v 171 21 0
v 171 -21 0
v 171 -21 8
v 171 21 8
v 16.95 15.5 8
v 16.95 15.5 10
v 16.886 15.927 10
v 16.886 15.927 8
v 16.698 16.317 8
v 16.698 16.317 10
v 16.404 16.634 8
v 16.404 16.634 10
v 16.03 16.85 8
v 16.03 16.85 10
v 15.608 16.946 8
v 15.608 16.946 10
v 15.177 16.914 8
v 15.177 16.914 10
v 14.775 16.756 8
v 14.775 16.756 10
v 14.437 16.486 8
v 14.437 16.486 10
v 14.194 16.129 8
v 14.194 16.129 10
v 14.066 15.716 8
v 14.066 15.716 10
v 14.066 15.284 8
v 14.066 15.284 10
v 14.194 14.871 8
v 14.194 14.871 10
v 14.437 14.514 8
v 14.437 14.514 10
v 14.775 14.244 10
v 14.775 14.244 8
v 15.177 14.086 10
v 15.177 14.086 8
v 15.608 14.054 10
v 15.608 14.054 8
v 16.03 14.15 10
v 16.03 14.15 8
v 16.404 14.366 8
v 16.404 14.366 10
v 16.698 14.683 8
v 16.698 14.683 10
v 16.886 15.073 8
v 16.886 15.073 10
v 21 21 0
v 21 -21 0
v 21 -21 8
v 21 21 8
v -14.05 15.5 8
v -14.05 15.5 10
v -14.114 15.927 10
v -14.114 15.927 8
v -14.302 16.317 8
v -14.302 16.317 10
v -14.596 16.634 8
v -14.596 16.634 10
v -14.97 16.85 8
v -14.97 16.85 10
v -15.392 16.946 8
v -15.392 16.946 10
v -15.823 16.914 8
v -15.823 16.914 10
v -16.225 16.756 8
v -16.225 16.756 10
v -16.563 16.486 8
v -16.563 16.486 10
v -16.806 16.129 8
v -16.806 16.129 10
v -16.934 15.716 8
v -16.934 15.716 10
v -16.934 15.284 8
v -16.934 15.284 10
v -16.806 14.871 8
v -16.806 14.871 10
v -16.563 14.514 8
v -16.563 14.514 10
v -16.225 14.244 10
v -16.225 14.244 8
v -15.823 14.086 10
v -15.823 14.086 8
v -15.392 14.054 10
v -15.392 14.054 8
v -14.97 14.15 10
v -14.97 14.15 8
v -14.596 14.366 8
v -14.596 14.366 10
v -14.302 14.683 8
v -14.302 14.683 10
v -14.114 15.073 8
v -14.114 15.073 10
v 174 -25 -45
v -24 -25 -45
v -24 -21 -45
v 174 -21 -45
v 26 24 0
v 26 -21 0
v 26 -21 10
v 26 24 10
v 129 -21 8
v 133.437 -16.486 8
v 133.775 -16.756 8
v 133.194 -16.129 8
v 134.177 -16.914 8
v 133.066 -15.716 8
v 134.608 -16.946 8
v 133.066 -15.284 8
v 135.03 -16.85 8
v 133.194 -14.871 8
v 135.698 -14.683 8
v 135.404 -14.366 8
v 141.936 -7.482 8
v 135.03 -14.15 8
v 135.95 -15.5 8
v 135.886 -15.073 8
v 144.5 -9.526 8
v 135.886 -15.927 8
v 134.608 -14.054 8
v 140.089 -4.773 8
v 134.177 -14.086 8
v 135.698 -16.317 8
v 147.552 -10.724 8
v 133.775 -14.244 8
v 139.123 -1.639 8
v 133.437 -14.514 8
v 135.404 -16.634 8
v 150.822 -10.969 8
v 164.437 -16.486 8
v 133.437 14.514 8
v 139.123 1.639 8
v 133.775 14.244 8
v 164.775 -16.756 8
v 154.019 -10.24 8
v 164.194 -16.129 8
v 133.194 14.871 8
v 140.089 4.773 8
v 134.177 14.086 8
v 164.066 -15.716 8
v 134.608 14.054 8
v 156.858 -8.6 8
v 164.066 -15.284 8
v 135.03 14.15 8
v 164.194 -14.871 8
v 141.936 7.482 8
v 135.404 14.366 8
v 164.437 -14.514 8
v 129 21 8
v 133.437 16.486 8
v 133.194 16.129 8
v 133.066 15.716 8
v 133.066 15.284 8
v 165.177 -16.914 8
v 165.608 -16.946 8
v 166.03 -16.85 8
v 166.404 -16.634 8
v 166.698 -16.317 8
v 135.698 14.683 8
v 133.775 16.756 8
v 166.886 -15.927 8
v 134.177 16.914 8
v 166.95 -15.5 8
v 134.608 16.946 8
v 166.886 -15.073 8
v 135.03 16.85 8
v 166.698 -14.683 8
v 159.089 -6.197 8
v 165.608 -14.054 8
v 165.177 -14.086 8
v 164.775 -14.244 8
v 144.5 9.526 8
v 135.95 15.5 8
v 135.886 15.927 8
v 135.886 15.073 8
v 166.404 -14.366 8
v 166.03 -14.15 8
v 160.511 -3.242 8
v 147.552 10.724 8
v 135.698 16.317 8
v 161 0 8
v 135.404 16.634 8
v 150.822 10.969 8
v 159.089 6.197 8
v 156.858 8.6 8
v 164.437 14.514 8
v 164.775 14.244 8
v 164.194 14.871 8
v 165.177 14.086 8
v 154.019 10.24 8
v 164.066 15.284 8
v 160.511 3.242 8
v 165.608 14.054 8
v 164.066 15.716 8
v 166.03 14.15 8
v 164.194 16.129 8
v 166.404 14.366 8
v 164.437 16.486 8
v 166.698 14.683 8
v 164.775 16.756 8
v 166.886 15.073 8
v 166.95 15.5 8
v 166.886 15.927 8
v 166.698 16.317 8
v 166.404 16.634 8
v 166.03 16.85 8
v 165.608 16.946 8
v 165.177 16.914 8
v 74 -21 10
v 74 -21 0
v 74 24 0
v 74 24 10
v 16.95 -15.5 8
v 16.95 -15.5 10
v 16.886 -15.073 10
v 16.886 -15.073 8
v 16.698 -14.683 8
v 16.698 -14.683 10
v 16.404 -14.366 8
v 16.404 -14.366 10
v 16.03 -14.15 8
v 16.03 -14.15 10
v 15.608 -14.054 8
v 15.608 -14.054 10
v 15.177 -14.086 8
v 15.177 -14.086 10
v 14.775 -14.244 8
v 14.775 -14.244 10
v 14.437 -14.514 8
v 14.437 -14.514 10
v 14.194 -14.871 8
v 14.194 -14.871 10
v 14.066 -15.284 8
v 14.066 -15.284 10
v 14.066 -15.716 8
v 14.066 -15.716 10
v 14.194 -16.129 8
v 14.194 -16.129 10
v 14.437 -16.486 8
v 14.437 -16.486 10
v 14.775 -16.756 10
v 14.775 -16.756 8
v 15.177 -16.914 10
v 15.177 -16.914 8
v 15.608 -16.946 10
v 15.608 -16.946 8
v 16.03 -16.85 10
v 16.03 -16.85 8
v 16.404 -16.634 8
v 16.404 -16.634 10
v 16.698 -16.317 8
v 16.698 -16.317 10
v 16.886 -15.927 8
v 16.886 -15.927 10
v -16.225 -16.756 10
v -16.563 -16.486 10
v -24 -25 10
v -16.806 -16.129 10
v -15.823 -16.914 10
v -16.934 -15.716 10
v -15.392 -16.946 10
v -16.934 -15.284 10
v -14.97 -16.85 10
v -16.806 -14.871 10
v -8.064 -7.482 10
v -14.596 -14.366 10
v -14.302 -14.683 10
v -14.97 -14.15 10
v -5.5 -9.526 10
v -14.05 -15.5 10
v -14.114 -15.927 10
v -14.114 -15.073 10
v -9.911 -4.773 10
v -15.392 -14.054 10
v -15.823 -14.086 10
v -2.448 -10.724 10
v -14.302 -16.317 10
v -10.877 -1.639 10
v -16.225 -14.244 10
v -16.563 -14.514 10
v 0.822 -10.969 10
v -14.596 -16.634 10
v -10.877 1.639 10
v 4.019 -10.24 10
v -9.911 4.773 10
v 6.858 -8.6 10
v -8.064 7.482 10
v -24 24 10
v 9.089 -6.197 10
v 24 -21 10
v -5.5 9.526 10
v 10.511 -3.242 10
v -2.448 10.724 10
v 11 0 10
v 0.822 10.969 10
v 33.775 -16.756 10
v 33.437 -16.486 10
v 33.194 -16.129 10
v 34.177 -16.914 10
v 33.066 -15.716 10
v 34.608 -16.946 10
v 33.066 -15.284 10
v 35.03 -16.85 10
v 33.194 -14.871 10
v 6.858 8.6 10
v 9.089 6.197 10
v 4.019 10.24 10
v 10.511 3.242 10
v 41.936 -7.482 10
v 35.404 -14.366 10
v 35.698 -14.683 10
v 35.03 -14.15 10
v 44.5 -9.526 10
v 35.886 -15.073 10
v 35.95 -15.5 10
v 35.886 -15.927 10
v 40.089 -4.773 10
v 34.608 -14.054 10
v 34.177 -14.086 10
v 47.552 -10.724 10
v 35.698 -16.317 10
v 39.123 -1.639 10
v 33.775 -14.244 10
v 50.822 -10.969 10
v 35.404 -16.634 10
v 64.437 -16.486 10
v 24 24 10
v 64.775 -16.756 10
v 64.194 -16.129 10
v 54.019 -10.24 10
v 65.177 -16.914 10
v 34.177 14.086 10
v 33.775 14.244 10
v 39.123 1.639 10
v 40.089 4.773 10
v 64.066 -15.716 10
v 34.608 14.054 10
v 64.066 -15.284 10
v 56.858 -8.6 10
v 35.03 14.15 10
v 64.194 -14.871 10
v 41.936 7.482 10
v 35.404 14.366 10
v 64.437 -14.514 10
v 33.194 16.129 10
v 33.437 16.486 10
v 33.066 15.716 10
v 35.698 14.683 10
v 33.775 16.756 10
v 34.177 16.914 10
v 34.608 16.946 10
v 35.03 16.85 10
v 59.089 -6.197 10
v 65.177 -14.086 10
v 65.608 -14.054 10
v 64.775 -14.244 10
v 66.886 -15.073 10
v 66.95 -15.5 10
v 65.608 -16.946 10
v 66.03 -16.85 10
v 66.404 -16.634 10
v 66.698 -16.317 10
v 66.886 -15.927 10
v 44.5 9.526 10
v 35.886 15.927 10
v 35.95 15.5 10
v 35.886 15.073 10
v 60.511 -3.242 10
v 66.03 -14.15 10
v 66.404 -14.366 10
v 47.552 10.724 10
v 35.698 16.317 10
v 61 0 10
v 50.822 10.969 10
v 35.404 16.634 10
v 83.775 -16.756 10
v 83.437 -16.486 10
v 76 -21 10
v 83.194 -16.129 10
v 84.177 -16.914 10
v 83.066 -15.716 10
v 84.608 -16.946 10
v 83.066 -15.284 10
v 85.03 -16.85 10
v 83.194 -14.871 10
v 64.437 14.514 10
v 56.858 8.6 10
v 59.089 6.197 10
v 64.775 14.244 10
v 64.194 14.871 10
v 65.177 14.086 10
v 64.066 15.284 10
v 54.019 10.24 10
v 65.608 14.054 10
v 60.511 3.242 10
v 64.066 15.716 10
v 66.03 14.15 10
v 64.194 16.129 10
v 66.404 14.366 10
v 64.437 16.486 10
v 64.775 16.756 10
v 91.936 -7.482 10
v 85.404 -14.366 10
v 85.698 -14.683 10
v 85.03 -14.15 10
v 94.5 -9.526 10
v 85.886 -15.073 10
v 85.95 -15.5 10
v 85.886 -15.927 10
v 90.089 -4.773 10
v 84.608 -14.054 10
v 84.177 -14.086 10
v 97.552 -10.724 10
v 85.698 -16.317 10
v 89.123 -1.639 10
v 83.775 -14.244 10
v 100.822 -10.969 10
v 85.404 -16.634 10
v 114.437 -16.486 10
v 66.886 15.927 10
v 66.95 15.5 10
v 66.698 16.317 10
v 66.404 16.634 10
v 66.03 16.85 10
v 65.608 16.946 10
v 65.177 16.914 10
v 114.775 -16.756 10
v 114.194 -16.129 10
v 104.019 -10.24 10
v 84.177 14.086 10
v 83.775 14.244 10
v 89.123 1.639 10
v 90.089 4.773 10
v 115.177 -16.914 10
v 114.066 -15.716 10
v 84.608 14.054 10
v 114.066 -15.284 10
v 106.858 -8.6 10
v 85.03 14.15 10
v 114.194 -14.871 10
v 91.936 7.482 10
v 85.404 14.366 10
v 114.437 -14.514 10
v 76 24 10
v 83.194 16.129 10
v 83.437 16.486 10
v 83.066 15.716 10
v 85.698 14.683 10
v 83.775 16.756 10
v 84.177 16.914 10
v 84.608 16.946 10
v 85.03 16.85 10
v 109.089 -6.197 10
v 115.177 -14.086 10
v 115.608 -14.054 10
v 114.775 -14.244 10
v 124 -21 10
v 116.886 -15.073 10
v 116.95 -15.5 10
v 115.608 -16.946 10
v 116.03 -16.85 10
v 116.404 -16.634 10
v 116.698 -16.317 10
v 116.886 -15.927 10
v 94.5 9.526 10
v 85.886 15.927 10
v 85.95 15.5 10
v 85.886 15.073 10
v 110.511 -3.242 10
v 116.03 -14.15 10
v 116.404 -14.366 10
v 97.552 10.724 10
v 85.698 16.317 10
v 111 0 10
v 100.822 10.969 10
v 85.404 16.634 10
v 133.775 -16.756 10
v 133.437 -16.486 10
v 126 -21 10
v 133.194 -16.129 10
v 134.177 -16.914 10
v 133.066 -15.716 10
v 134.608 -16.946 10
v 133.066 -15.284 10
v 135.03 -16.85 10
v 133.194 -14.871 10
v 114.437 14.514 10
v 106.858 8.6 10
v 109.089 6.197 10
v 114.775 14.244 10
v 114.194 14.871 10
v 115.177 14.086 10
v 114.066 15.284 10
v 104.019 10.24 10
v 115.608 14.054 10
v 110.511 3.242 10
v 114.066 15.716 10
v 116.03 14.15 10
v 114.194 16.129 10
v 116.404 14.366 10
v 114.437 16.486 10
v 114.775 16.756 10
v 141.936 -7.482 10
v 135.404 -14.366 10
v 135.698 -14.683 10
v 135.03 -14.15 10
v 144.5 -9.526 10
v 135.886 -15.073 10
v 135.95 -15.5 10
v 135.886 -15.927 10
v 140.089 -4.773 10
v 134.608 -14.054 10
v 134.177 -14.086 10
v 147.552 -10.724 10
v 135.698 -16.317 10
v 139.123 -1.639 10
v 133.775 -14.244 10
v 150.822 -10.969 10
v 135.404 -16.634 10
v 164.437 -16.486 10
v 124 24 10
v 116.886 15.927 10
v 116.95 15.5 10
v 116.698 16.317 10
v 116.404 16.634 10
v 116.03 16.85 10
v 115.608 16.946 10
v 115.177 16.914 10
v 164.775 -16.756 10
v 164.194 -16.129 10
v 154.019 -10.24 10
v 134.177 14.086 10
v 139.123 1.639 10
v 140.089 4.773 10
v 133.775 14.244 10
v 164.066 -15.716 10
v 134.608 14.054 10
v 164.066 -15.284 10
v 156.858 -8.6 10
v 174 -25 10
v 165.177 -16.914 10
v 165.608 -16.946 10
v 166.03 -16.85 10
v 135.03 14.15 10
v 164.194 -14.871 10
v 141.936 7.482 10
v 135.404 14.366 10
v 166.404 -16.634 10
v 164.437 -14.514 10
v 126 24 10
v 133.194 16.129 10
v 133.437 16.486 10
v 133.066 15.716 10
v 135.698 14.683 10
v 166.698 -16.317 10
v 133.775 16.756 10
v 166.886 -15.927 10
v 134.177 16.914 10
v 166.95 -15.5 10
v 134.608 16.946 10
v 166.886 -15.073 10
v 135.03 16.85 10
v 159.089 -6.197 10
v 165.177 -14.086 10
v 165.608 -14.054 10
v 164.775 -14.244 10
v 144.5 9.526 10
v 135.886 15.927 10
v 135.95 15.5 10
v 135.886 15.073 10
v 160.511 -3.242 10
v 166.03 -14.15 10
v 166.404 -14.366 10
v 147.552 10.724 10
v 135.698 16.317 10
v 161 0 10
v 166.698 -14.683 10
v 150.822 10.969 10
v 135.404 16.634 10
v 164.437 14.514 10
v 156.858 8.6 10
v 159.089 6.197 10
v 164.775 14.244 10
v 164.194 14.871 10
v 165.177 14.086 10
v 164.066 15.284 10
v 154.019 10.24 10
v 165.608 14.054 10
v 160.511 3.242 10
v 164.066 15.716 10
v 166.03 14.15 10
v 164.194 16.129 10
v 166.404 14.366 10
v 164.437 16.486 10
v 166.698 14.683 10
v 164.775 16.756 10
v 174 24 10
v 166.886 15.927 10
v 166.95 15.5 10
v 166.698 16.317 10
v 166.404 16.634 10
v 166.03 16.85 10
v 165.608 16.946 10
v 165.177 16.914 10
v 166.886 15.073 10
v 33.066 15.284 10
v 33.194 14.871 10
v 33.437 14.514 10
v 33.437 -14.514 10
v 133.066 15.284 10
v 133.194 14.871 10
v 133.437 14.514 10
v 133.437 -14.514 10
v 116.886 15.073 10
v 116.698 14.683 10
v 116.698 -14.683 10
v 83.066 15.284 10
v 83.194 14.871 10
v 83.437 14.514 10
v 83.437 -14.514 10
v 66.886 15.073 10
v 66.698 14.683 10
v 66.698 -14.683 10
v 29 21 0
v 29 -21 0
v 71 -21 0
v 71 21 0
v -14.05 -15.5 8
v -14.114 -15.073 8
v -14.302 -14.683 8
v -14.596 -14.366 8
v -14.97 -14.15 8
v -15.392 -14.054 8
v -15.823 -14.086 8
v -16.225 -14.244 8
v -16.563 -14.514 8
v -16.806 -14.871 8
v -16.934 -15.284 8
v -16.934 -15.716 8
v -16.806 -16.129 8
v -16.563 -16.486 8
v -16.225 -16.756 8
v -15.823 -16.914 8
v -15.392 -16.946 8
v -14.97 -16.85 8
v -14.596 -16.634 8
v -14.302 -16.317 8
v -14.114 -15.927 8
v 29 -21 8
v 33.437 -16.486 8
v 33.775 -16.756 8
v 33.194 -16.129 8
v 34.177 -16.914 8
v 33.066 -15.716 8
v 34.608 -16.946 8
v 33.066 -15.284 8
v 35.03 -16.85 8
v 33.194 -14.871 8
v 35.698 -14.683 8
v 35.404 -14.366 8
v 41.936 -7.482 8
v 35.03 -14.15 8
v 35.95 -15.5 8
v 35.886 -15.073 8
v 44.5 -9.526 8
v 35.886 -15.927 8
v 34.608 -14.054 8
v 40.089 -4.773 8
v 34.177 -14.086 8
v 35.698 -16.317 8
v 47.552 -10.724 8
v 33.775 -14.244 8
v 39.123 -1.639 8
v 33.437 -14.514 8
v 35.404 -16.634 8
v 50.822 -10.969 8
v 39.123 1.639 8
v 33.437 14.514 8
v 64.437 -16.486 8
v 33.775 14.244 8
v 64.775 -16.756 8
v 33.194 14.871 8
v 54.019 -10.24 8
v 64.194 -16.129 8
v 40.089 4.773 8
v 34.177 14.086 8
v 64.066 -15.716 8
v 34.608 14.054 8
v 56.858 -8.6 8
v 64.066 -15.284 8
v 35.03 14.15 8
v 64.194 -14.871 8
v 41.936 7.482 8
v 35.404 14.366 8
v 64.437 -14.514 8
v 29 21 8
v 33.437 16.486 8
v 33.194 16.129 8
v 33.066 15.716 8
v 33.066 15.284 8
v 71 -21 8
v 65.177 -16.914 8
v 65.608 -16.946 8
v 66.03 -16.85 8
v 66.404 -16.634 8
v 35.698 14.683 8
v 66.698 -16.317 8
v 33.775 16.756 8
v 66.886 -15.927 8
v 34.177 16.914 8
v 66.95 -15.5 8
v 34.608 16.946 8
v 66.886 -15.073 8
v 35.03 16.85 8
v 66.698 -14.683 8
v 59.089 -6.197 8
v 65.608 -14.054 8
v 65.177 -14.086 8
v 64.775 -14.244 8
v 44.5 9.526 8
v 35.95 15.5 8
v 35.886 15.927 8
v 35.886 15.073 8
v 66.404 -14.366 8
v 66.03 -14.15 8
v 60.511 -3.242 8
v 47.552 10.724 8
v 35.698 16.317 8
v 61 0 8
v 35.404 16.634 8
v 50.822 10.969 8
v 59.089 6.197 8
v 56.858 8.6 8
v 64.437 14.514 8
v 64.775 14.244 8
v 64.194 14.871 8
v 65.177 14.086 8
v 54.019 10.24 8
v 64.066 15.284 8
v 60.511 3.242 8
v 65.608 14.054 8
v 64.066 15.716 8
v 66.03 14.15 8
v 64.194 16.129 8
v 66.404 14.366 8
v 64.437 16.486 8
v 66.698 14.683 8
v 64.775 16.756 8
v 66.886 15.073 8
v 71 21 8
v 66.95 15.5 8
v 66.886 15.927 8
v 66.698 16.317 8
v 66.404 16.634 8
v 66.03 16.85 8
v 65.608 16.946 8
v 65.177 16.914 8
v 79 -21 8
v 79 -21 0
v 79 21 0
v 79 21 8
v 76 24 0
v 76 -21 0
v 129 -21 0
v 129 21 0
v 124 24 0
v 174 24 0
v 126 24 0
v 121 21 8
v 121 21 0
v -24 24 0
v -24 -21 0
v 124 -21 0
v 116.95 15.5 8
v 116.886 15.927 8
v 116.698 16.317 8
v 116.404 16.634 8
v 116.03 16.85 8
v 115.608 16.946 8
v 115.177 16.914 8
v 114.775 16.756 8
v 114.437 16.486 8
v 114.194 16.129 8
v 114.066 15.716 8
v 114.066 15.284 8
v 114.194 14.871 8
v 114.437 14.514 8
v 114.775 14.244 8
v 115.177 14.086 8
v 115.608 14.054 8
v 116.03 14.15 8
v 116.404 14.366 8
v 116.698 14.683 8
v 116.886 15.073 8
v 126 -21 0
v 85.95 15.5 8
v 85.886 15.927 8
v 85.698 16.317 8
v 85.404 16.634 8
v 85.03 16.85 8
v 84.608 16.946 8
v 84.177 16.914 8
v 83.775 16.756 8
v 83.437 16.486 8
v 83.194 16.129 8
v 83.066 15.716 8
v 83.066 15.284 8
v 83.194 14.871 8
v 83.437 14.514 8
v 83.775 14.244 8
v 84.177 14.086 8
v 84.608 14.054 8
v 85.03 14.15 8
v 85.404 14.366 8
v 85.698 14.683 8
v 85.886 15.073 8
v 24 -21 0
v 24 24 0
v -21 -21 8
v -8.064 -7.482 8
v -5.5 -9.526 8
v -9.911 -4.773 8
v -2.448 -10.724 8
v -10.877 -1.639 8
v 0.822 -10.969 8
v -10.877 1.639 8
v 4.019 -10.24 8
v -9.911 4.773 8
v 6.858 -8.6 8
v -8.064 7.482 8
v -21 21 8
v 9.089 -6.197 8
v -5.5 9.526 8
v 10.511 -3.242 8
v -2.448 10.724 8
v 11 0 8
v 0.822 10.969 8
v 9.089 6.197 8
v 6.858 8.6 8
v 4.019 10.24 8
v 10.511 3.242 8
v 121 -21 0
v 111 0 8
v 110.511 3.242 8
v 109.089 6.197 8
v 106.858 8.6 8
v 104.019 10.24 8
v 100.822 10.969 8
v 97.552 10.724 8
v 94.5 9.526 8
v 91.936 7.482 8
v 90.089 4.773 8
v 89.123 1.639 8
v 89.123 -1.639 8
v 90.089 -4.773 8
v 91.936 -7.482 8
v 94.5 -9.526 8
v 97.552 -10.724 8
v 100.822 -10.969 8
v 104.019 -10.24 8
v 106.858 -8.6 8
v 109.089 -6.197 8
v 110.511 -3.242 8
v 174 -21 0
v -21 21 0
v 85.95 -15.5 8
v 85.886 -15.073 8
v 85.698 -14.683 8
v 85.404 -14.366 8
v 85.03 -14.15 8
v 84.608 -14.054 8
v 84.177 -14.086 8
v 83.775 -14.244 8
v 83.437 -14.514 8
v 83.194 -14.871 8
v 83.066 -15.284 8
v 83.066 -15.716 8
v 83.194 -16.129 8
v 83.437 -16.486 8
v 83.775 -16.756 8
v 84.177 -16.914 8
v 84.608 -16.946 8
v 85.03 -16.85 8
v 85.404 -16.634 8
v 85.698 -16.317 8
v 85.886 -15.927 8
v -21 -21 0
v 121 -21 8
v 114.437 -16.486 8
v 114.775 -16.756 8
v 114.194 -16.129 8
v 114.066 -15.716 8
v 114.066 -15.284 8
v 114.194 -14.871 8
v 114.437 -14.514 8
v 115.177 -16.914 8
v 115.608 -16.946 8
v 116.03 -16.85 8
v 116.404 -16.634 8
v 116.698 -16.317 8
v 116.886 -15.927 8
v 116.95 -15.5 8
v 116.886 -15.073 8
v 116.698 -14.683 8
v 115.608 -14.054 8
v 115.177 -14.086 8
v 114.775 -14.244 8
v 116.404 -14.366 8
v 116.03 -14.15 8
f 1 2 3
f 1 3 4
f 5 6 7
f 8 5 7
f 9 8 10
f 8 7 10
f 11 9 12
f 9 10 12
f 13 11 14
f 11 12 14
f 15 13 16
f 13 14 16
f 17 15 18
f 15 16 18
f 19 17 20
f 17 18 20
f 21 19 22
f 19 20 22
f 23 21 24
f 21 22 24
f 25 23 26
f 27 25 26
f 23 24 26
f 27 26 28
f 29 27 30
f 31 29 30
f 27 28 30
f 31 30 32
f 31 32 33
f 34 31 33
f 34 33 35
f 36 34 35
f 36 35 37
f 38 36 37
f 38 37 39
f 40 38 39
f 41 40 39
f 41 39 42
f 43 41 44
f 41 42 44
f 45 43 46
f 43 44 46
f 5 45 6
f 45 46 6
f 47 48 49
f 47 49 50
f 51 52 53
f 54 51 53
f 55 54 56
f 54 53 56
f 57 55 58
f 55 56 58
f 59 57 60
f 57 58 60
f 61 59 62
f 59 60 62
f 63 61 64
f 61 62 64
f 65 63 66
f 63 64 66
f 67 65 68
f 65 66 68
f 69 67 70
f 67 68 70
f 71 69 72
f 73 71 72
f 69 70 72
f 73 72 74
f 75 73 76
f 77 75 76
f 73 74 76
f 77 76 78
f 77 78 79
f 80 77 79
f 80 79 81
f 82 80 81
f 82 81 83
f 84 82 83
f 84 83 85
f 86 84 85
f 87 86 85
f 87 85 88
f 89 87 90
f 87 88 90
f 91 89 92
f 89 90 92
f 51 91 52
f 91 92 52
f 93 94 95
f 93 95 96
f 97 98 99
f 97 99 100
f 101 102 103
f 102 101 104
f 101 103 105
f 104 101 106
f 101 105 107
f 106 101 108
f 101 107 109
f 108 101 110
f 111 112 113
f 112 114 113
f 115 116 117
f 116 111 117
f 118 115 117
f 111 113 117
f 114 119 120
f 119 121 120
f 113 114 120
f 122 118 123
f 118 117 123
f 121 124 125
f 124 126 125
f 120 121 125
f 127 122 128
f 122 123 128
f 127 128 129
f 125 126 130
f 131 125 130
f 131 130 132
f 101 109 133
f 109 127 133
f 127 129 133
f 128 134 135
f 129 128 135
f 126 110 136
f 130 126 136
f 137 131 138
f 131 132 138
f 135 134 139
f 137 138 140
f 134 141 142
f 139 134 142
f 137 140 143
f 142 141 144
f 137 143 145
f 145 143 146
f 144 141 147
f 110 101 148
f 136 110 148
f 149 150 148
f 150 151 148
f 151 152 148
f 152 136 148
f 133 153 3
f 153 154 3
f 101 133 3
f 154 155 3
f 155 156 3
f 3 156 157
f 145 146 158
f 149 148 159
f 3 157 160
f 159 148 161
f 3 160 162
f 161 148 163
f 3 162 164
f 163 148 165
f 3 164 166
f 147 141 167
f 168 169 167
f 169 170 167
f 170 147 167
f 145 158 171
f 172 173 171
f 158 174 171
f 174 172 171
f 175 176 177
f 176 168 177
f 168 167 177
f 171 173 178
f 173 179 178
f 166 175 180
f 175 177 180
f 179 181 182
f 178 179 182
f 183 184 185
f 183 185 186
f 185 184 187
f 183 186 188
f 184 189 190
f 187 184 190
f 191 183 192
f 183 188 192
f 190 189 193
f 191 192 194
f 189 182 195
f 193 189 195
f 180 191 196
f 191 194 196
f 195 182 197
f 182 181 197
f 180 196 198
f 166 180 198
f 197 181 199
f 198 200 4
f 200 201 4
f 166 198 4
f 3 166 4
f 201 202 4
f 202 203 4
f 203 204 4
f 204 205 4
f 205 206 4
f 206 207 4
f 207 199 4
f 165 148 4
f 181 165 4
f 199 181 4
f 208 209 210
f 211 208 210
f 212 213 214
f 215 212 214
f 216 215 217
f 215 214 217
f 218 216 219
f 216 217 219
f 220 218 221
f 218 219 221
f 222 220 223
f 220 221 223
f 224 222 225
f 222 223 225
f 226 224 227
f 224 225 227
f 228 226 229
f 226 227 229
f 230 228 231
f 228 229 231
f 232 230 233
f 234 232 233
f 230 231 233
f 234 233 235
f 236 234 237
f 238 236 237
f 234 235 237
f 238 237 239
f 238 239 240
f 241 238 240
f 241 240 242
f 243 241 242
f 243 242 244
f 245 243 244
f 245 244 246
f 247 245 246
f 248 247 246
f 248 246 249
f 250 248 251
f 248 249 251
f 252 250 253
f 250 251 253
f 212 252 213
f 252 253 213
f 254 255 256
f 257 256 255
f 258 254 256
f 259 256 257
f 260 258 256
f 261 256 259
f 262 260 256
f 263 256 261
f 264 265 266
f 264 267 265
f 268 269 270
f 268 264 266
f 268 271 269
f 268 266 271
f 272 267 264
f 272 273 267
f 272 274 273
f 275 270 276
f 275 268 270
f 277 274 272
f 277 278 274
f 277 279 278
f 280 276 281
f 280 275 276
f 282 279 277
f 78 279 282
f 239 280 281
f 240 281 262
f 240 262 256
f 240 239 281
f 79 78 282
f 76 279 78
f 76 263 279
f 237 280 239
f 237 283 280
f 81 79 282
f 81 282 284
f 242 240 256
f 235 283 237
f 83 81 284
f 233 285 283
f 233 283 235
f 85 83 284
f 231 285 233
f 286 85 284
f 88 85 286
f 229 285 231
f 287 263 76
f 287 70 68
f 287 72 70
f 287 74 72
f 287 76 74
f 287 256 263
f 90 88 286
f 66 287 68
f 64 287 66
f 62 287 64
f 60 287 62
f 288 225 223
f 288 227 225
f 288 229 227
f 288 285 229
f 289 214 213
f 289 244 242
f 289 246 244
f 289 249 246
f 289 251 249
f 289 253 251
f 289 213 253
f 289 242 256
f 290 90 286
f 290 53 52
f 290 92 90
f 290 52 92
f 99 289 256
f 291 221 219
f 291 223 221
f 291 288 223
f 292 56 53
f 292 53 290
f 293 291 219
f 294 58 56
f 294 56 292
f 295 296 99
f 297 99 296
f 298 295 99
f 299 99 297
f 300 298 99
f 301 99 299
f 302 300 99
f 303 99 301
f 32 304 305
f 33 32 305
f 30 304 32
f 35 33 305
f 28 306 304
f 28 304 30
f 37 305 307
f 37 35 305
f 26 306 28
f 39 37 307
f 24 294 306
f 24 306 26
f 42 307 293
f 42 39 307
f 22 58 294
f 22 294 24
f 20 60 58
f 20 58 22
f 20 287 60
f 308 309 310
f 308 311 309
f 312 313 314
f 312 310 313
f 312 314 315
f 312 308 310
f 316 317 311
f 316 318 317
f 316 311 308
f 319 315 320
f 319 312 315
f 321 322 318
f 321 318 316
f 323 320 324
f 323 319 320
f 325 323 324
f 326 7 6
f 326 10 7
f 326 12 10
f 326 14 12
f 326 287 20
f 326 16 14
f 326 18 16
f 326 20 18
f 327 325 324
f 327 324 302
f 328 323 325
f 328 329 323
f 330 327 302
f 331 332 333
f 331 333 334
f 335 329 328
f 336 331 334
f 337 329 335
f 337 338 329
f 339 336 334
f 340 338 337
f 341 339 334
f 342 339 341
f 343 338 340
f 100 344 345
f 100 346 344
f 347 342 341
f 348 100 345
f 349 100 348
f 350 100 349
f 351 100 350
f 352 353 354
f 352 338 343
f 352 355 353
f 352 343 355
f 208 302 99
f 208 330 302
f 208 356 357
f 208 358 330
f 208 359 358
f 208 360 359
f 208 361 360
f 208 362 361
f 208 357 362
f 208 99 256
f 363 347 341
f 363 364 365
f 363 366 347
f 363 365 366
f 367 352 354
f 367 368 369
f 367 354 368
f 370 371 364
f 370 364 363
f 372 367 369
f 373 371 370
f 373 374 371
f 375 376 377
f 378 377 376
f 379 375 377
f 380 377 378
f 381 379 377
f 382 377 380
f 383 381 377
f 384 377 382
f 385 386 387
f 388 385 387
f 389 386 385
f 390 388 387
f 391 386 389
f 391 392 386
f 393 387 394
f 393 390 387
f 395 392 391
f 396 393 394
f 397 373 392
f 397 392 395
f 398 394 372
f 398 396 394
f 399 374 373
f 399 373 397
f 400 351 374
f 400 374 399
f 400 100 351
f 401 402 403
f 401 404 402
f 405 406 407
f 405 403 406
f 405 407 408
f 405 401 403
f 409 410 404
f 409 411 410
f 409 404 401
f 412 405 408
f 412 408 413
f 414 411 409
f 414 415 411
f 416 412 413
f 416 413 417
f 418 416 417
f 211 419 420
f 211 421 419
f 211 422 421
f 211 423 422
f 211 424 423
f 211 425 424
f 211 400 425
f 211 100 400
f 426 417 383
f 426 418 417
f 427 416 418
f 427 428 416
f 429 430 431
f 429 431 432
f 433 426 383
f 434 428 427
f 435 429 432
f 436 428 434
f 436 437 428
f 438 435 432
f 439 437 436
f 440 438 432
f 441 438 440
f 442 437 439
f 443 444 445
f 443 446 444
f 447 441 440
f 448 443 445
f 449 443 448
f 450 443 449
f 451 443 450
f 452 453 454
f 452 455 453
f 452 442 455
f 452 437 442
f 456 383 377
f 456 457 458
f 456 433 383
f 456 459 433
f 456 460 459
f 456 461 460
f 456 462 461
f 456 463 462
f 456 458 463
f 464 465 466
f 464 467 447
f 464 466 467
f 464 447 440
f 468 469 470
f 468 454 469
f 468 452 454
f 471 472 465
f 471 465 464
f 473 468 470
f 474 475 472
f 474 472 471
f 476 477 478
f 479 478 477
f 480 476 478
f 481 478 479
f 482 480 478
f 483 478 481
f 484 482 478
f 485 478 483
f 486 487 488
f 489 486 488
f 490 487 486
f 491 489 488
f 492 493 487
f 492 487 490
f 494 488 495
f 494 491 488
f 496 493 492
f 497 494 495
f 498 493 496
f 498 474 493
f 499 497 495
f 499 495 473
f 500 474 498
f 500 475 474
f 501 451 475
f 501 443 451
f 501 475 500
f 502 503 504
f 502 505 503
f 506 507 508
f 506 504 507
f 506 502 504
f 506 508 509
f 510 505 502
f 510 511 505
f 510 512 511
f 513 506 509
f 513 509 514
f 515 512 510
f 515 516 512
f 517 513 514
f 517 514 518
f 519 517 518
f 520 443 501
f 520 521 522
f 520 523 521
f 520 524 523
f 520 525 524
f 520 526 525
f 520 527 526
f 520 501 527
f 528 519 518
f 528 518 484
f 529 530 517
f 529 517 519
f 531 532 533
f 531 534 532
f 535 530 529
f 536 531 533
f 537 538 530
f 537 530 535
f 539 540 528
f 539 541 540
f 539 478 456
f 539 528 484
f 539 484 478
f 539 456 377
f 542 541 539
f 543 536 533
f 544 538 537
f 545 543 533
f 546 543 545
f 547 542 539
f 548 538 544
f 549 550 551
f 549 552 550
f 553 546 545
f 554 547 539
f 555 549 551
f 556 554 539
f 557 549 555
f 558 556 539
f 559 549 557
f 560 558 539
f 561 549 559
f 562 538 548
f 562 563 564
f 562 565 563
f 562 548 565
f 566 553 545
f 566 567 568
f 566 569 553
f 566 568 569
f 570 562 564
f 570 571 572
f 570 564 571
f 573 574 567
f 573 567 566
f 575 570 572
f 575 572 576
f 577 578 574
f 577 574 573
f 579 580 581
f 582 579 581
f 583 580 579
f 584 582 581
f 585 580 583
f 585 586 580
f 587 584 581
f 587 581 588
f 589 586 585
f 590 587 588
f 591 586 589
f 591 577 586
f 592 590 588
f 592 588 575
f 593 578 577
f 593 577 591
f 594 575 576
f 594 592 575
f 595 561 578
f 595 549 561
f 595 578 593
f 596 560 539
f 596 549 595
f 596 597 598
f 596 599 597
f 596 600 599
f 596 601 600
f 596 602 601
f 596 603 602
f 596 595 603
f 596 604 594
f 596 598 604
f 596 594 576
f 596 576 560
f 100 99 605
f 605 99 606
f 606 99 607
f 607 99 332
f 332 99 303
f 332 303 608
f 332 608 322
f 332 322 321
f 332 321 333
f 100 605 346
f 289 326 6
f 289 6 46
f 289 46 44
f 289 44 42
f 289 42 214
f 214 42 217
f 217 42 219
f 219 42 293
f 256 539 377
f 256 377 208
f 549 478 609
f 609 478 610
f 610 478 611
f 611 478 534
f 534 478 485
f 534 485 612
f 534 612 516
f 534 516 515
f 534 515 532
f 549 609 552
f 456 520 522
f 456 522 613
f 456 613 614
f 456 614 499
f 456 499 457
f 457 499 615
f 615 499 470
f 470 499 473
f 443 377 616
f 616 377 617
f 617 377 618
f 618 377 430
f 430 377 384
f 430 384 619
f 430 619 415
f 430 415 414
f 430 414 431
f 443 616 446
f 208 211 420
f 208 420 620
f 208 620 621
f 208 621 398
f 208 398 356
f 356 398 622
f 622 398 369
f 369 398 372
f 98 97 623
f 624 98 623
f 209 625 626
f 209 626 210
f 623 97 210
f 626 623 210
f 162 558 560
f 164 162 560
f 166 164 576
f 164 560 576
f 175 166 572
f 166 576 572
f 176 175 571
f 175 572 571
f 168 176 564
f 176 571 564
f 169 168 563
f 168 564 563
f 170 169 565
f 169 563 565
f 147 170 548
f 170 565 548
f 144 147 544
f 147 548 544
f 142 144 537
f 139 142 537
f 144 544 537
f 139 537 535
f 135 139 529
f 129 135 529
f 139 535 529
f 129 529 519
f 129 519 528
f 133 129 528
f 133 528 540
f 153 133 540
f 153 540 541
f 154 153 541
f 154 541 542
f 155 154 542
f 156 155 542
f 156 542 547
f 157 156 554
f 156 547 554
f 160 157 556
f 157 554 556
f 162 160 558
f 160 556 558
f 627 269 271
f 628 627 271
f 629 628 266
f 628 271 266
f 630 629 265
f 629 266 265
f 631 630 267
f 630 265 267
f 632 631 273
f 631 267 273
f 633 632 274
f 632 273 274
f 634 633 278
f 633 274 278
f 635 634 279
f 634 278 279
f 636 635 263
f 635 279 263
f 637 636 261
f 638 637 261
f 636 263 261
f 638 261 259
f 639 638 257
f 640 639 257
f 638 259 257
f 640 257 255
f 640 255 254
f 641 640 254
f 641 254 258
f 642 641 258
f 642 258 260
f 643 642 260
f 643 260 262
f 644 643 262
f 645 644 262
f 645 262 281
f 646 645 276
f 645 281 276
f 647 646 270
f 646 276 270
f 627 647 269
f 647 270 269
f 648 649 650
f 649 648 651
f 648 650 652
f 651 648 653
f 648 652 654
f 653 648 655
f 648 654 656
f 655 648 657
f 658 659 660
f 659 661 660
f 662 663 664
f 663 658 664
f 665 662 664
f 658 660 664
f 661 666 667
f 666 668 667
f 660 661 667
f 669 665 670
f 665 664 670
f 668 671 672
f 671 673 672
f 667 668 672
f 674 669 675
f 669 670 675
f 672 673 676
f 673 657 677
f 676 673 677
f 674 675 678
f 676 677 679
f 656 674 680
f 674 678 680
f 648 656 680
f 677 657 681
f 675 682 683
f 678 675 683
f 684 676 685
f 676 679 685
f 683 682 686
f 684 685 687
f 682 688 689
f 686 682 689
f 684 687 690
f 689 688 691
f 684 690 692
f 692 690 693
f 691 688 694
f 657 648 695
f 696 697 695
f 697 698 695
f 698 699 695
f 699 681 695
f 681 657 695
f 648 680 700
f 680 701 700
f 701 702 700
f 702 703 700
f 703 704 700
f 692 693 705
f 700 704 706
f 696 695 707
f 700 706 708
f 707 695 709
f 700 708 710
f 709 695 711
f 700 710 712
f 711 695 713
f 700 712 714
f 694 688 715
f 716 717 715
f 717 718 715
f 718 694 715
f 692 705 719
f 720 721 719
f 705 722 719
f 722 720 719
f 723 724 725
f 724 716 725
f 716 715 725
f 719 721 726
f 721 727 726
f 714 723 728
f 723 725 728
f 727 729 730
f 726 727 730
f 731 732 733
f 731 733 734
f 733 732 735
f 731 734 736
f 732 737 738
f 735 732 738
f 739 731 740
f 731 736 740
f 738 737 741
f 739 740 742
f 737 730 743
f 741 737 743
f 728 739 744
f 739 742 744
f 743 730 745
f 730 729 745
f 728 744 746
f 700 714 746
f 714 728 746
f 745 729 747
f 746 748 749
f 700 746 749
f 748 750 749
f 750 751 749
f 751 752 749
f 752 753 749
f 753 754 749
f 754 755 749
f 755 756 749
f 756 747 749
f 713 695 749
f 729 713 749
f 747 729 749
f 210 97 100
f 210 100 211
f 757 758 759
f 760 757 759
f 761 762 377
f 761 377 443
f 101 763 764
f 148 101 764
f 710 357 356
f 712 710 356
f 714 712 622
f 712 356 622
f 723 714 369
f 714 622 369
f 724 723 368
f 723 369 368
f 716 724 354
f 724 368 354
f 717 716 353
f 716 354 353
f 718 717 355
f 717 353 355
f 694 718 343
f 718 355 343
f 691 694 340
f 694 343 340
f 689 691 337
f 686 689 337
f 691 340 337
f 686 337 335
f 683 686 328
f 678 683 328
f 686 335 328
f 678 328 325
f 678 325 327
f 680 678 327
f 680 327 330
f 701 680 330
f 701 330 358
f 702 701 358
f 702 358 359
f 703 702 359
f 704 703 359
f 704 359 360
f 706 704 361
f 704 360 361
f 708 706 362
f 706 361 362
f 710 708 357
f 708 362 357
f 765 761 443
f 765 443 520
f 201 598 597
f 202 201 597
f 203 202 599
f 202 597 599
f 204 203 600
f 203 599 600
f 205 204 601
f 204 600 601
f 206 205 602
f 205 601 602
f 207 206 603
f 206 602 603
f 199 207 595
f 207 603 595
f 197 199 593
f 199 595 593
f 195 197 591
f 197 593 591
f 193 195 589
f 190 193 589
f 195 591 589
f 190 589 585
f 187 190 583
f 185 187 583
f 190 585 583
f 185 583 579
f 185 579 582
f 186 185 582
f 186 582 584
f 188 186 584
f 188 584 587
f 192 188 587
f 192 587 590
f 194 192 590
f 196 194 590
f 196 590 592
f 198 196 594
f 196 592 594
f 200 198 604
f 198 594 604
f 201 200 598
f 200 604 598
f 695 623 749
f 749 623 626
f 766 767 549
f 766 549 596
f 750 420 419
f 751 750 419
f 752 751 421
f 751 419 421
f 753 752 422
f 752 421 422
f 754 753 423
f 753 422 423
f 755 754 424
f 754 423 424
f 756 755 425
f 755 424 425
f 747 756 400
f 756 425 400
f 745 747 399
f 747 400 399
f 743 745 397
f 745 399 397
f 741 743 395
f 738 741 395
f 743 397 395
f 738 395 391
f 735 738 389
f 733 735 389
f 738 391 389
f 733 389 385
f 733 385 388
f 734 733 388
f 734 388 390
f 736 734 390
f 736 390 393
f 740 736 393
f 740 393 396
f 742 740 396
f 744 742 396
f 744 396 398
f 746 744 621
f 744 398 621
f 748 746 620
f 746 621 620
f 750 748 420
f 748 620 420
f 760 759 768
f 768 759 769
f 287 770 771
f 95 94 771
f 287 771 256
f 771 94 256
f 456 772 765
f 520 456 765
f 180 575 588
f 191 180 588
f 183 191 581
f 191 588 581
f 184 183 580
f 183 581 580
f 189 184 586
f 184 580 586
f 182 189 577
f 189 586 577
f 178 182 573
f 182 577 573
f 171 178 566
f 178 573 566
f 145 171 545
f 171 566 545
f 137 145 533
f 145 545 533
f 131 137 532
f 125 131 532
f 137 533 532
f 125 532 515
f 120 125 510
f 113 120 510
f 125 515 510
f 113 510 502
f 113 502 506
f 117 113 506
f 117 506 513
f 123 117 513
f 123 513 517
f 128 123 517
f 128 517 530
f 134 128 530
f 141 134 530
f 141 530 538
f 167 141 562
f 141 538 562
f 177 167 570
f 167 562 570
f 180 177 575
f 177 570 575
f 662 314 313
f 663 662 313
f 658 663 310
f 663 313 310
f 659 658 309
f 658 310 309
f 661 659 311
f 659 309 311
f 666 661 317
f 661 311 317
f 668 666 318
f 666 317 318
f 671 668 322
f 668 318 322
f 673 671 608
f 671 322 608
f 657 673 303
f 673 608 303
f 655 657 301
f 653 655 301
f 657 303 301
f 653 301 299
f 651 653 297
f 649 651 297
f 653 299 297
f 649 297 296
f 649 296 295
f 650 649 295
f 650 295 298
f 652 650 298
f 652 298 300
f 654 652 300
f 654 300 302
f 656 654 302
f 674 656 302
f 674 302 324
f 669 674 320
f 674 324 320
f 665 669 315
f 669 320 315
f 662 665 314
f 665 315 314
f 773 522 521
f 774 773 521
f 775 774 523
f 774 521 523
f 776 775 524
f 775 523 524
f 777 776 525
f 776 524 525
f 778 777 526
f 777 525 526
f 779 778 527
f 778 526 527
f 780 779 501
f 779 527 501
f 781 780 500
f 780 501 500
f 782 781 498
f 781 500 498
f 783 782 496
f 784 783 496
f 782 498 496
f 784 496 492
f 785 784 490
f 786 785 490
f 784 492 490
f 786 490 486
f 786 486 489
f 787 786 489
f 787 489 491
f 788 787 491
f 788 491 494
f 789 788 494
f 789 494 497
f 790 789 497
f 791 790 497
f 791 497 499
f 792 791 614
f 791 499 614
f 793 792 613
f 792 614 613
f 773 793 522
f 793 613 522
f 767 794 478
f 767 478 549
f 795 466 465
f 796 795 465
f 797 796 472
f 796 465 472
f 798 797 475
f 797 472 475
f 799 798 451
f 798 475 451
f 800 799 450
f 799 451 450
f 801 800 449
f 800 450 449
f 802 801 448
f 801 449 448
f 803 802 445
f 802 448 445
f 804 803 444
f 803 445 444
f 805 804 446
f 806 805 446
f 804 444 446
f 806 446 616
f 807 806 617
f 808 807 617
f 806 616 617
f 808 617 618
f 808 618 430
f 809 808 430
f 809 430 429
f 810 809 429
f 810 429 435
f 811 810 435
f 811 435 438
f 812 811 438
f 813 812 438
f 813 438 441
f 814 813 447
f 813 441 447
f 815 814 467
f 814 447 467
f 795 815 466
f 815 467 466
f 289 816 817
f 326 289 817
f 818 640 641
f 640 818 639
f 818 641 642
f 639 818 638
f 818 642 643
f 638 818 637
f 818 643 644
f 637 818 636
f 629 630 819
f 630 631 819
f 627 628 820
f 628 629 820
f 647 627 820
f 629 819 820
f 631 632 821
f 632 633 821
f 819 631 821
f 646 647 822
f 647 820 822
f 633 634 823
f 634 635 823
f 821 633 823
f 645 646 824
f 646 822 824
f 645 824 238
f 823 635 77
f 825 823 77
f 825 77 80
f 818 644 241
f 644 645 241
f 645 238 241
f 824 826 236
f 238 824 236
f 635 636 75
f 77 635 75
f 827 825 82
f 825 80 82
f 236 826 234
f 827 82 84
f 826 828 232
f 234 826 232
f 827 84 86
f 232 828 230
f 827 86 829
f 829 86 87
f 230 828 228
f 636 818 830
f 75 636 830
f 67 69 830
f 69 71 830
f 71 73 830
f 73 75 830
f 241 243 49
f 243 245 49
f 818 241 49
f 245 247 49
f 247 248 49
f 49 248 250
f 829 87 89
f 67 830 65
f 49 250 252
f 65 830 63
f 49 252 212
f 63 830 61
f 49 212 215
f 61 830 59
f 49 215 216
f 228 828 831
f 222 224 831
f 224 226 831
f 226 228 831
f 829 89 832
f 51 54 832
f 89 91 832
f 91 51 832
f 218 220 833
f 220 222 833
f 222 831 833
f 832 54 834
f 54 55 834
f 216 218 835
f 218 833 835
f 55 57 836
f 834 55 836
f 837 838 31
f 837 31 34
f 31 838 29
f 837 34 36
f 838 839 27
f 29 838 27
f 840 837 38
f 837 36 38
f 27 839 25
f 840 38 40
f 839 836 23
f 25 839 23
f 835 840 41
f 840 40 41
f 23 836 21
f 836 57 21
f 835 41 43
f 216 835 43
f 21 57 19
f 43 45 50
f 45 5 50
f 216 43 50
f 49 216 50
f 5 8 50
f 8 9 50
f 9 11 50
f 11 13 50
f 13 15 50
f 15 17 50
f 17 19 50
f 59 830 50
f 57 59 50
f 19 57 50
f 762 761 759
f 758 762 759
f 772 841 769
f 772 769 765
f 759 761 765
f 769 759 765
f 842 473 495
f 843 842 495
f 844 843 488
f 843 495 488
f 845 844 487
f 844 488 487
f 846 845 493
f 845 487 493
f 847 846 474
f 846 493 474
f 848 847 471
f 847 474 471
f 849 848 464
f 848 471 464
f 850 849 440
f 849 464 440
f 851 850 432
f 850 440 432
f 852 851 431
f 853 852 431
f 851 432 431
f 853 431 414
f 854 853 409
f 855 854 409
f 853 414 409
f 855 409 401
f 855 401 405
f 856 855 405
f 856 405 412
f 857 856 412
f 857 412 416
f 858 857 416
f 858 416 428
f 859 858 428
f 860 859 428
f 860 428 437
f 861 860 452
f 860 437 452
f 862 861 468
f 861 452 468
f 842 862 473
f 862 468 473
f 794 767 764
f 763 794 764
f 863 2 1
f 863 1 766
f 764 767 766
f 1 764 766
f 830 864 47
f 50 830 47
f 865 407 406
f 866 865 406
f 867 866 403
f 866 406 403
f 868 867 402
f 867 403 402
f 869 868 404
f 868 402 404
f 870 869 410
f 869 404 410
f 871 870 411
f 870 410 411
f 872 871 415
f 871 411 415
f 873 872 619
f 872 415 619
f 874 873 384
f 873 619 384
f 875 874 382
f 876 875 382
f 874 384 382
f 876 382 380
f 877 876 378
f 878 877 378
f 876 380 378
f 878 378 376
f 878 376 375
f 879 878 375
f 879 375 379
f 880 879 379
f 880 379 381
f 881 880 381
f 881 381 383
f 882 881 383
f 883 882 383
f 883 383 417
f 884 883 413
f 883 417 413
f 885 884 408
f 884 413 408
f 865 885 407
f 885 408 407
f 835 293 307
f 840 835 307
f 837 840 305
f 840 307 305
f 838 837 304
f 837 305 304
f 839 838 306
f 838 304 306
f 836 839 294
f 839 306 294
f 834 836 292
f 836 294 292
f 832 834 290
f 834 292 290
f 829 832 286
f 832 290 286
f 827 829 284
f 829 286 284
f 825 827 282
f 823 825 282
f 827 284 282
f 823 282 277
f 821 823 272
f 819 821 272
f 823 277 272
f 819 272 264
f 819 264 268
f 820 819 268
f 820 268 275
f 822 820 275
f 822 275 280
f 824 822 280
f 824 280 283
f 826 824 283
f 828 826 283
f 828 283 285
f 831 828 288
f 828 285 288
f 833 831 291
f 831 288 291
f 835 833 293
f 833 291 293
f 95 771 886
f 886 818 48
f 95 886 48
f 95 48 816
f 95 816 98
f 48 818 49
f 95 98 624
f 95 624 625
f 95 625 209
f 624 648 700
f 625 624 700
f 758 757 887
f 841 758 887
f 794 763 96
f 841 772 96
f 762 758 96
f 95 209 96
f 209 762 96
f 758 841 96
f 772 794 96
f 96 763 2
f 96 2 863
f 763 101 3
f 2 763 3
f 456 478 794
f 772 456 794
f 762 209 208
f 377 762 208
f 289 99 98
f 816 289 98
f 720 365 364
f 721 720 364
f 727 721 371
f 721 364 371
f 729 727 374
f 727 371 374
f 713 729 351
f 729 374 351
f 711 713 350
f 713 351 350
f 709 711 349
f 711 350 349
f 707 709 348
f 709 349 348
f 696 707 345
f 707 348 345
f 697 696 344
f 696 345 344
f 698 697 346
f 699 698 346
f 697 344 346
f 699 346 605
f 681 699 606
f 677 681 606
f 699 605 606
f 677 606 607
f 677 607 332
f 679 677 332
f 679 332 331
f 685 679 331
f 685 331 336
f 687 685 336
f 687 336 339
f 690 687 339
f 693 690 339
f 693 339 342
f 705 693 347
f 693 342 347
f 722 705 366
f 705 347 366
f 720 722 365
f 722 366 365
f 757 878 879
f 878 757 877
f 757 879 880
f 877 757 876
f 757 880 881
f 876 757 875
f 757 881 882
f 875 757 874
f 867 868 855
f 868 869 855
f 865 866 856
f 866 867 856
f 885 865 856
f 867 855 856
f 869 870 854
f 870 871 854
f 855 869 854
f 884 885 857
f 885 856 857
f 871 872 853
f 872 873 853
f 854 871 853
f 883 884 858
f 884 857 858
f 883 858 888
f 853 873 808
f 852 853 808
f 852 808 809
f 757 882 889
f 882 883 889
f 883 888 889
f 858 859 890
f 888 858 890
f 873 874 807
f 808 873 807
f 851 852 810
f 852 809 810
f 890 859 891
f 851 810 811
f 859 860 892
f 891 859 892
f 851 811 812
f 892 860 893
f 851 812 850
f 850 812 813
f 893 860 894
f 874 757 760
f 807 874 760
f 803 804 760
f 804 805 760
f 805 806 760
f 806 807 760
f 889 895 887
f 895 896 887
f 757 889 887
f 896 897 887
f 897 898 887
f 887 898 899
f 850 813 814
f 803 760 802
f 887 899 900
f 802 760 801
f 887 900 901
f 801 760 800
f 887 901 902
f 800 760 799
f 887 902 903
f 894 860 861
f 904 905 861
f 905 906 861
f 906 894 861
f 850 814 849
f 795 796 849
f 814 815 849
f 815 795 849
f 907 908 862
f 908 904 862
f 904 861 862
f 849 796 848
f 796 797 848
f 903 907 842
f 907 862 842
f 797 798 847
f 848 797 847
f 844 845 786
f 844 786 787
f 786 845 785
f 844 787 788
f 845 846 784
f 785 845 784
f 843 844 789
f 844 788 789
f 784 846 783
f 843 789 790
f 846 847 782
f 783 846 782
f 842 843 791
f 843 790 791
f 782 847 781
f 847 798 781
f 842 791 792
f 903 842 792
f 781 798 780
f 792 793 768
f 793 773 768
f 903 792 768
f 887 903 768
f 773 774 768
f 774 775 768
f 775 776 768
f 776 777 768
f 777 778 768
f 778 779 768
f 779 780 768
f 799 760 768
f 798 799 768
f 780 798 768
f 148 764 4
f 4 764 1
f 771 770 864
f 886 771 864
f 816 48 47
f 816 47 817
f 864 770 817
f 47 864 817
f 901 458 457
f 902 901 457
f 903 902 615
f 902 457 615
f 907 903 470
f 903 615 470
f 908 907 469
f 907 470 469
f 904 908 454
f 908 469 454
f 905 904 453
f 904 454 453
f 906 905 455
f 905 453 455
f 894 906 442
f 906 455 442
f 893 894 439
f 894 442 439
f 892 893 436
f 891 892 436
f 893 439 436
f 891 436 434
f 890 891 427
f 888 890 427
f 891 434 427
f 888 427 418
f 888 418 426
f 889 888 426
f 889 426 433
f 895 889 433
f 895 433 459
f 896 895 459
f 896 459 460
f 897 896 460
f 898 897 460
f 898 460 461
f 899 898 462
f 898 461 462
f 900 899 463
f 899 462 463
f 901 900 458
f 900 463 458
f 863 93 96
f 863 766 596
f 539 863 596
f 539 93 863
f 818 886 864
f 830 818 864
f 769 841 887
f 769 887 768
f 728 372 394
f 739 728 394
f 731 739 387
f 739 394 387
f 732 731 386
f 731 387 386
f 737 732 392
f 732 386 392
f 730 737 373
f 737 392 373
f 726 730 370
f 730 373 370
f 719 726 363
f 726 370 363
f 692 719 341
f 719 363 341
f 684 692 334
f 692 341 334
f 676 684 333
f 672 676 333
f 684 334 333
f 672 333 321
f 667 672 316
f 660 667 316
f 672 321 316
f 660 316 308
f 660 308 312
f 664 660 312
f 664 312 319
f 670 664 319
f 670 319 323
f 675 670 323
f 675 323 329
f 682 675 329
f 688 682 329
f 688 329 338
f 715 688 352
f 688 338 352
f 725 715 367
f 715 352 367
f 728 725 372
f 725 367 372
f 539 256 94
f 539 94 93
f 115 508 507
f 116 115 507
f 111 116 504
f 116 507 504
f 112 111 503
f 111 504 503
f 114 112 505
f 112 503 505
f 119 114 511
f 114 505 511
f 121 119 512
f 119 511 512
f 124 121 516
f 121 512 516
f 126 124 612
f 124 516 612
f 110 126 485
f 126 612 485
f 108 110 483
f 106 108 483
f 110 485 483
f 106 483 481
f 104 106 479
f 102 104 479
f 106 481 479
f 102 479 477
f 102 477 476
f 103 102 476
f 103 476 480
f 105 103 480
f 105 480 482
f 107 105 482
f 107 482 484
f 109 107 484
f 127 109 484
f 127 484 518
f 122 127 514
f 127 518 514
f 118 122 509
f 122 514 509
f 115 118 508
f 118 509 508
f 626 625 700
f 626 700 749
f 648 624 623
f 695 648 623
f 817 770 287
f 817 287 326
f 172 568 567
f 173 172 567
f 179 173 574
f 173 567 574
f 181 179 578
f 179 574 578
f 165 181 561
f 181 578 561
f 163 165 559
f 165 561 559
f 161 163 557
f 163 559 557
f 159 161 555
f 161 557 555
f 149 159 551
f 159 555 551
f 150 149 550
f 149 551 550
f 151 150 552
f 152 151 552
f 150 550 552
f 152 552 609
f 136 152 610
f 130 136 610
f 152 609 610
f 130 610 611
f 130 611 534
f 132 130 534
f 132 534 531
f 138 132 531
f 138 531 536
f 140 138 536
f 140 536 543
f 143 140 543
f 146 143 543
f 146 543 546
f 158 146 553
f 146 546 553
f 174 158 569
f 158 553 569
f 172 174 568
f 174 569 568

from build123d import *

# Parameters (mm, degrees)
SKETCH_1_W           = 48
SKETCH_1_H           = 48
SKETCH_1_W_2         = 42
SKETCH_1_H_2         = 42
EXTRUDE_1_DEPTH      = 10
EXTRUDE_1_2_DEPTH    = 10
EXTRUDE_1_3_DEPTH    = 10
EXTRUDE_1_4_DEPTH    = 10
SKETCH_2_W           = 42
SKETCH_2_H           = 42
SKETCH_2_R           = 1.45
SKETCH_2_R_2         = 11
EXTRUDE_2_DEPTH      = 2
EXTRUDE_3_DEPTH      = 1
EXTRUDE_3_DEPTH_BACK = 3
SKETCH_3_W           = 198
SKETCH_3_H           = 55


with BuildPart() as part:
    # Эскиз1 → Бобышка-Вытянуть1 (new body)
    with BuildSketch(Plane.XY):
        Rectangle(SKETCH_1_W, SKETCH_1_H)
        Rectangle(SKETCH_1_W_2, SKETCH_1_H_2, mode=Mode.SUBTRACT)
    extrude(amount=EXTRUDE_1_DEPTH)

    # Эскиз2 → Бобышка-Вытянуть2 (add)
    # profile 1 of 4: a face of its own
    with BuildSketch(Plane.XY.offset(10)):
        Rectangle(SKETCH_2_W, SKETCH_2_H)
        with Locations((-15.5, 15.5)):
            Circle(SKETCH_2_R, mode=Mode.SUBTRACT)
        with Locations((15.5, 15.5)):
            Circle(SKETCH_2_R, mode=Mode.SUBTRACT)
        with Locations((15.5, -15.5)):
            Circle(SKETCH_2_R, mode=Mode.SUBTRACT)
        with Locations((-15.5, -15.5)):
            Circle(SKETCH_2_R, mode=Mode.SUBTRACT)
        Circle(SKETCH_2_R_2, mode=Mode.SUBTRACT)
    # profile 2 of 4: a face of its own
    with BuildSketch(Plane.XY.offset(10)):
        with Locations((50, 0)):
            Rectangle(SKETCH_2_W, SKETCH_2_H)
        with Locations((34.5, 15.5)):
            Circle(SKETCH_2_R, mode=Mode.SUBTRACT)
        with Locations((65.5, 15.5)):
            Circle(SKETCH_2_R, mode=Mode.SUBTRACT)
        with Locations((65.5, -15.5)):
            Circle(SKETCH_2_R, mode=Mode.SUBTRACT)
        with Locations((34.5, -15.5)):
            Circle(SKETCH_2_R, mode=Mode.SUBTRACT)
        with Locations((50, 0)):
            Circle(SKETCH_2_R_2, mode=Mode.SUBTRACT)
    # profile 3 of 4: a face of its own
    with BuildSketch(Plane.XY.offset(10)):
        with Locations((100, 0)):
            Rectangle(SKETCH_2_W, SKETCH_2_H)
        with Locations((84.5, 15.5)):
            Circle(SKETCH_2_R, mode=Mode.SUBTRACT)
        with Locations((115.5, 15.5)):
            Circle(SKETCH_2_R, mode=Mode.SUBTRACT)
        with Locations((115.5, -15.5)):
            Circle(SKETCH_2_R, mode=Mode.SUBTRACT)
        with Locations((84.5, -15.5)):
            Circle(SKETCH_2_R, mode=Mode.SUBTRACT)
        with Locations((100, 0)):
            Circle(SKETCH_2_R_2, mode=Mode.SUBTRACT)
    # profile 4 of 4: a face of its own
    with BuildSketch(Plane.XY.offset(10)):
        with Locations((150, 0)):
            Rectangle(SKETCH_2_W, SKETCH_2_H)
        with Locations((134.5, 15.5)):
            Circle(SKETCH_2_R, mode=Mode.SUBTRACT)
        with Locations((165.5, 15.5)):
            Circle(SKETCH_2_R, mode=Mode.SUBTRACT)
        with Locations((165.5, -15.5)):
            Circle(SKETCH_2_R, mode=Mode.SUBTRACT)
        with Locations((134.5, -15.5)):
            Circle(SKETCH_2_R, mode=Mode.SUBTRACT)
        with Locations((150, 0)):
            Circle(SKETCH_2_R_2, mode=Mode.SUBTRACT)
    extrude(amount=-EXTRUDE_2_DEPTH)


with BuildPart() as body_2:
    # Эскиз1 → Extrude 1 2 (new body)
    with BuildSketch(Plane.XY):
        with Locations((50, 0)):
            Rectangle(SKETCH_1_W, SKETCH_1_H)
        with Locations((50, 0)):
            Rectangle(SKETCH_1_W_2, SKETCH_1_H_2, mode=Mode.SUBTRACT)
    extrude(amount=EXTRUDE_1_2_DEPTH)


with BuildPart() as body_3:
    # Эскиз1 → Extrude 1 3 (new body)
    with BuildSketch(Plane.XY):
        with Locations((100, 0)):
            Rectangle(SKETCH_1_W, SKETCH_1_H)
        with Locations((100, 0)):
            Rectangle(SKETCH_1_W_2, SKETCH_1_H_2, mode=Mode.SUBTRACT)
    extrude(amount=EXTRUDE_1_3_DEPTH)


with BuildPart() as body_4:
    # Эскиз1 → Extrude 1 4 (new body)
    with BuildSketch(Plane.XY):
        with Locations((150, 0)):
            Rectangle(SKETCH_1_W, SKETCH_1_H)
        with Locations((150, 0)):
            Rectangle(SKETCH_1_W_2, SKETCH_1_H_2, mode=Mode.SUBTRACT)
    extrude(amount=EXTRUDE_1_4_DEPTH)


with BuildPart() as extrude_2_piece_1:
    # of the separate pieces the step leaves, piece 1, a body of its own (extrude_2_pieces)
    add(part.part.solids().sort_by_distance((-24, -24, 0))[0])

    # Эскиз3 → Бобышка-Вытянуть3 (add, two sides: drawn at the far end of the back side and taken through both)
    with BuildSketch(Plane.XZ.offset(24).offset(-EXTRUDE_3_DEPTH_BACK)):
        with Locations((75, -17.5)):
            Rectangle(SKETCH_3_W, SKETCH_3_H)
    extrude(amount=EXTRUDE_3_DEPTH + EXTRUDE_3_DEPTH_BACK)


with BuildPart() as extrude_2_piece_2:
    # of the separate pieces the step leaves, piece 2, a body of its own (extrude_2_pieces)
    add(part.part.solids().sort_by_distance((79, 21, 10))[0])


with BuildPart() as extrude_2_piece_3:
    # of the separate pieces the step leaves, piece 3, a body of its own (extrude_2_pieces)
    add(part.part.solids().sort_by_distance((29, 21, 10))[0])


with BuildPart() as extrude_2_piece_4:
    # of the separate pieces the step leaves, piece 4, a body of its own (extrude_2_pieces)
    add(part.part.solids().sort_by_distance((129, 21, 10))[0])


with BuildPart() as body_4_1:
    add(body_4.part)

    # Combine 1: union Бобышка-Вытянуть2 piece 3, Бобышка-Вытянуть2 piece 2, Бобышка-Вытянуть2 piece 4, Бобышка-Вытянуть2 piece 1, body 3, body 2
    add(extrude_2_piece_3.part)
    add(extrude_2_piece_2.part)
    add(extrude_2_piece_4.part)
    add(extrude_2_piece_1.part)
    add(body_3.part)
    add(body_2.part)


solid = body_4_1.part
